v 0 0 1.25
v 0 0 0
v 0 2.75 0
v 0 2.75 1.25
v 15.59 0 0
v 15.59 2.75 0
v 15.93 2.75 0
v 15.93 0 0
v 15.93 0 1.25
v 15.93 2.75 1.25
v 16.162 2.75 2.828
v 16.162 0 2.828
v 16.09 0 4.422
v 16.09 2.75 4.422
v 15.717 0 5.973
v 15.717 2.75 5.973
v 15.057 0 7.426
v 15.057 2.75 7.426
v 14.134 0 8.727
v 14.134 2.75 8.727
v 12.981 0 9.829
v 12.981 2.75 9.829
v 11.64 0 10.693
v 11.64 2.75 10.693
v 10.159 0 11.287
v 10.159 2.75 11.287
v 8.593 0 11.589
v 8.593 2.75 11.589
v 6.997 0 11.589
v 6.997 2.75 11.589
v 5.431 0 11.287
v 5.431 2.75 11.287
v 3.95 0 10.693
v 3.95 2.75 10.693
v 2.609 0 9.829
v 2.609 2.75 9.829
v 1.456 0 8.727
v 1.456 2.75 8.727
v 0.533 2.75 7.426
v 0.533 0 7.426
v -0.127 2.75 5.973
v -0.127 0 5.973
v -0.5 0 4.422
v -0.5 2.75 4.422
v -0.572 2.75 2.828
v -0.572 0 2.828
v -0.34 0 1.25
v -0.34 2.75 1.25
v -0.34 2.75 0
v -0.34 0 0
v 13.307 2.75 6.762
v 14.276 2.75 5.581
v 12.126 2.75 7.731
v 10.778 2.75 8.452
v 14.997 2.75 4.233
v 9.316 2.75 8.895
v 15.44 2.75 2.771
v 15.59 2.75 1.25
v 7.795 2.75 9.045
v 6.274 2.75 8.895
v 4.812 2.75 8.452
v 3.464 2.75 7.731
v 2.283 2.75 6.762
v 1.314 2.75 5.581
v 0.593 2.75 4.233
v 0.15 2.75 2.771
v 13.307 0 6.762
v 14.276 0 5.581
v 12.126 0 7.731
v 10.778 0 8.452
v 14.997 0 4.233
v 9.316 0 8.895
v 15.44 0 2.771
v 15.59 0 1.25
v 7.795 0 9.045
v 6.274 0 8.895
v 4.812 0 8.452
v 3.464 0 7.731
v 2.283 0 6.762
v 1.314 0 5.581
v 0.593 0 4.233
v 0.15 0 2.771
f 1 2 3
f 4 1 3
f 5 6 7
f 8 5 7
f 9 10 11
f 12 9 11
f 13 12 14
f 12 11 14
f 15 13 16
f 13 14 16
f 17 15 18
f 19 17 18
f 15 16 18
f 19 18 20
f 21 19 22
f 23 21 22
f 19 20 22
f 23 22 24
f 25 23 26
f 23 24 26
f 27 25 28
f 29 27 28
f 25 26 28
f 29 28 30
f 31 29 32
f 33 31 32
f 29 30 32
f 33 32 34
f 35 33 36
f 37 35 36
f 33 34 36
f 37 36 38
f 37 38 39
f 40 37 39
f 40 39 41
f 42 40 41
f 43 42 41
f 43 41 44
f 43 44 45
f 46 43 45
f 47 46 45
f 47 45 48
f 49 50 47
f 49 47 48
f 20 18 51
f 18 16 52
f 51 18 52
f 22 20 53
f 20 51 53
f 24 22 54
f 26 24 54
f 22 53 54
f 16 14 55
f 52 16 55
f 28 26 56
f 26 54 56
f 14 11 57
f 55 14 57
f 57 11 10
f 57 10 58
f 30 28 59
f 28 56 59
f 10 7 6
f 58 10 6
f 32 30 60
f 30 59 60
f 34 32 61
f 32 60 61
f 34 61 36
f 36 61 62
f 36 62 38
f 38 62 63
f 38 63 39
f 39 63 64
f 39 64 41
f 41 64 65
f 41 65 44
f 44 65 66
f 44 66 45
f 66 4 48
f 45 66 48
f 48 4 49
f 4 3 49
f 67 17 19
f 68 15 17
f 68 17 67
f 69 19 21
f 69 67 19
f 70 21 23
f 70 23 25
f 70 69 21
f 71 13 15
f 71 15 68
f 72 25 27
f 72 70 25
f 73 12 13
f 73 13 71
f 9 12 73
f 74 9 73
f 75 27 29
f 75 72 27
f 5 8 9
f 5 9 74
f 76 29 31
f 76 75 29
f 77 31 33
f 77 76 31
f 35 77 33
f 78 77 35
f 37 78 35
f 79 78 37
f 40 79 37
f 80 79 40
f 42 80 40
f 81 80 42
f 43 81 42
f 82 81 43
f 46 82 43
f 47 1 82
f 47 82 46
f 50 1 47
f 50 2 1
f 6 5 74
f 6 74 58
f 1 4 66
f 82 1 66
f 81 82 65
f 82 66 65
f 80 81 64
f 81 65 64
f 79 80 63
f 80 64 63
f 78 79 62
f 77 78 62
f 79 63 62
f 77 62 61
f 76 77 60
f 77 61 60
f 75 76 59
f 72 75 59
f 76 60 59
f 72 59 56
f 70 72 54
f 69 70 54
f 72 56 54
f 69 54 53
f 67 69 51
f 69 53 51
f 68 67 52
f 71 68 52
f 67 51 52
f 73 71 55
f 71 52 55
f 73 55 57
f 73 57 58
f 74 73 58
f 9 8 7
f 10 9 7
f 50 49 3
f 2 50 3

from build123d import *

# Parameters (mm, degrees)
SKETCH1_W             = 0.34
SKETCH1_H             = 2.75
BOSS_EXTRUDE1_DEPTH   = 1.25
SKETCH1_W_2           = 0.339999955
BOSS_EXTRUDE1_2_DEPTH = 1.25
BOSS_EXTRUDE2_DEPTH   = 2.75


with BuildPart() as part:
    # Sketch1 → Boss-Extrude1 (new body)
    with BuildSketch(Plane.XY):
        with Locations((-0.17, 1.375)):
            Rectangle(SKETCH1_W, SKETCH1_H)
    extrude(amount=BOSS_EXTRUDE1_DEPTH)



with BuildPart() as body_2:
    # Sketch1 → Boss-Extrude1 2 (new body)
    with BuildSketch(Plane.XY):
        with Locations((15.759999978, 1.375)):
            Rectangle(SKETCH1_W_2, SKETCH1_H)
    extrude(amount=BOSS_EXTRUDE1_2_DEPTH)


with BuildPart() as part_1:
    add(part.part)

    add(body_2.part)  # Boss-Extrude2 merges body 2
    # Sketch2 → Boss-Extrude2 (add)
    with BuildSketch(Plane(origin=(0, 2.75, 0), x_dir=(1, 0, 0), z_dir=(0, 1, 0))):
        with BuildLine():
            Line((-0.339999955, -1.25), (0, -1.25))
            ThreePointArc((0, -1.25), (7.795, -9.045), (15.59, -1.25))
            Line((15.59, -1.25), (15.929999955, -1.25))
            ThreePointArc((15.929999955, -1.25), (7.795, -11.627244432), (-0.339999955, -1.25))
        make_face()
    extrude(amount=-BOSS_EXTRUDE2_DEPTH)


solid = part_1.part
